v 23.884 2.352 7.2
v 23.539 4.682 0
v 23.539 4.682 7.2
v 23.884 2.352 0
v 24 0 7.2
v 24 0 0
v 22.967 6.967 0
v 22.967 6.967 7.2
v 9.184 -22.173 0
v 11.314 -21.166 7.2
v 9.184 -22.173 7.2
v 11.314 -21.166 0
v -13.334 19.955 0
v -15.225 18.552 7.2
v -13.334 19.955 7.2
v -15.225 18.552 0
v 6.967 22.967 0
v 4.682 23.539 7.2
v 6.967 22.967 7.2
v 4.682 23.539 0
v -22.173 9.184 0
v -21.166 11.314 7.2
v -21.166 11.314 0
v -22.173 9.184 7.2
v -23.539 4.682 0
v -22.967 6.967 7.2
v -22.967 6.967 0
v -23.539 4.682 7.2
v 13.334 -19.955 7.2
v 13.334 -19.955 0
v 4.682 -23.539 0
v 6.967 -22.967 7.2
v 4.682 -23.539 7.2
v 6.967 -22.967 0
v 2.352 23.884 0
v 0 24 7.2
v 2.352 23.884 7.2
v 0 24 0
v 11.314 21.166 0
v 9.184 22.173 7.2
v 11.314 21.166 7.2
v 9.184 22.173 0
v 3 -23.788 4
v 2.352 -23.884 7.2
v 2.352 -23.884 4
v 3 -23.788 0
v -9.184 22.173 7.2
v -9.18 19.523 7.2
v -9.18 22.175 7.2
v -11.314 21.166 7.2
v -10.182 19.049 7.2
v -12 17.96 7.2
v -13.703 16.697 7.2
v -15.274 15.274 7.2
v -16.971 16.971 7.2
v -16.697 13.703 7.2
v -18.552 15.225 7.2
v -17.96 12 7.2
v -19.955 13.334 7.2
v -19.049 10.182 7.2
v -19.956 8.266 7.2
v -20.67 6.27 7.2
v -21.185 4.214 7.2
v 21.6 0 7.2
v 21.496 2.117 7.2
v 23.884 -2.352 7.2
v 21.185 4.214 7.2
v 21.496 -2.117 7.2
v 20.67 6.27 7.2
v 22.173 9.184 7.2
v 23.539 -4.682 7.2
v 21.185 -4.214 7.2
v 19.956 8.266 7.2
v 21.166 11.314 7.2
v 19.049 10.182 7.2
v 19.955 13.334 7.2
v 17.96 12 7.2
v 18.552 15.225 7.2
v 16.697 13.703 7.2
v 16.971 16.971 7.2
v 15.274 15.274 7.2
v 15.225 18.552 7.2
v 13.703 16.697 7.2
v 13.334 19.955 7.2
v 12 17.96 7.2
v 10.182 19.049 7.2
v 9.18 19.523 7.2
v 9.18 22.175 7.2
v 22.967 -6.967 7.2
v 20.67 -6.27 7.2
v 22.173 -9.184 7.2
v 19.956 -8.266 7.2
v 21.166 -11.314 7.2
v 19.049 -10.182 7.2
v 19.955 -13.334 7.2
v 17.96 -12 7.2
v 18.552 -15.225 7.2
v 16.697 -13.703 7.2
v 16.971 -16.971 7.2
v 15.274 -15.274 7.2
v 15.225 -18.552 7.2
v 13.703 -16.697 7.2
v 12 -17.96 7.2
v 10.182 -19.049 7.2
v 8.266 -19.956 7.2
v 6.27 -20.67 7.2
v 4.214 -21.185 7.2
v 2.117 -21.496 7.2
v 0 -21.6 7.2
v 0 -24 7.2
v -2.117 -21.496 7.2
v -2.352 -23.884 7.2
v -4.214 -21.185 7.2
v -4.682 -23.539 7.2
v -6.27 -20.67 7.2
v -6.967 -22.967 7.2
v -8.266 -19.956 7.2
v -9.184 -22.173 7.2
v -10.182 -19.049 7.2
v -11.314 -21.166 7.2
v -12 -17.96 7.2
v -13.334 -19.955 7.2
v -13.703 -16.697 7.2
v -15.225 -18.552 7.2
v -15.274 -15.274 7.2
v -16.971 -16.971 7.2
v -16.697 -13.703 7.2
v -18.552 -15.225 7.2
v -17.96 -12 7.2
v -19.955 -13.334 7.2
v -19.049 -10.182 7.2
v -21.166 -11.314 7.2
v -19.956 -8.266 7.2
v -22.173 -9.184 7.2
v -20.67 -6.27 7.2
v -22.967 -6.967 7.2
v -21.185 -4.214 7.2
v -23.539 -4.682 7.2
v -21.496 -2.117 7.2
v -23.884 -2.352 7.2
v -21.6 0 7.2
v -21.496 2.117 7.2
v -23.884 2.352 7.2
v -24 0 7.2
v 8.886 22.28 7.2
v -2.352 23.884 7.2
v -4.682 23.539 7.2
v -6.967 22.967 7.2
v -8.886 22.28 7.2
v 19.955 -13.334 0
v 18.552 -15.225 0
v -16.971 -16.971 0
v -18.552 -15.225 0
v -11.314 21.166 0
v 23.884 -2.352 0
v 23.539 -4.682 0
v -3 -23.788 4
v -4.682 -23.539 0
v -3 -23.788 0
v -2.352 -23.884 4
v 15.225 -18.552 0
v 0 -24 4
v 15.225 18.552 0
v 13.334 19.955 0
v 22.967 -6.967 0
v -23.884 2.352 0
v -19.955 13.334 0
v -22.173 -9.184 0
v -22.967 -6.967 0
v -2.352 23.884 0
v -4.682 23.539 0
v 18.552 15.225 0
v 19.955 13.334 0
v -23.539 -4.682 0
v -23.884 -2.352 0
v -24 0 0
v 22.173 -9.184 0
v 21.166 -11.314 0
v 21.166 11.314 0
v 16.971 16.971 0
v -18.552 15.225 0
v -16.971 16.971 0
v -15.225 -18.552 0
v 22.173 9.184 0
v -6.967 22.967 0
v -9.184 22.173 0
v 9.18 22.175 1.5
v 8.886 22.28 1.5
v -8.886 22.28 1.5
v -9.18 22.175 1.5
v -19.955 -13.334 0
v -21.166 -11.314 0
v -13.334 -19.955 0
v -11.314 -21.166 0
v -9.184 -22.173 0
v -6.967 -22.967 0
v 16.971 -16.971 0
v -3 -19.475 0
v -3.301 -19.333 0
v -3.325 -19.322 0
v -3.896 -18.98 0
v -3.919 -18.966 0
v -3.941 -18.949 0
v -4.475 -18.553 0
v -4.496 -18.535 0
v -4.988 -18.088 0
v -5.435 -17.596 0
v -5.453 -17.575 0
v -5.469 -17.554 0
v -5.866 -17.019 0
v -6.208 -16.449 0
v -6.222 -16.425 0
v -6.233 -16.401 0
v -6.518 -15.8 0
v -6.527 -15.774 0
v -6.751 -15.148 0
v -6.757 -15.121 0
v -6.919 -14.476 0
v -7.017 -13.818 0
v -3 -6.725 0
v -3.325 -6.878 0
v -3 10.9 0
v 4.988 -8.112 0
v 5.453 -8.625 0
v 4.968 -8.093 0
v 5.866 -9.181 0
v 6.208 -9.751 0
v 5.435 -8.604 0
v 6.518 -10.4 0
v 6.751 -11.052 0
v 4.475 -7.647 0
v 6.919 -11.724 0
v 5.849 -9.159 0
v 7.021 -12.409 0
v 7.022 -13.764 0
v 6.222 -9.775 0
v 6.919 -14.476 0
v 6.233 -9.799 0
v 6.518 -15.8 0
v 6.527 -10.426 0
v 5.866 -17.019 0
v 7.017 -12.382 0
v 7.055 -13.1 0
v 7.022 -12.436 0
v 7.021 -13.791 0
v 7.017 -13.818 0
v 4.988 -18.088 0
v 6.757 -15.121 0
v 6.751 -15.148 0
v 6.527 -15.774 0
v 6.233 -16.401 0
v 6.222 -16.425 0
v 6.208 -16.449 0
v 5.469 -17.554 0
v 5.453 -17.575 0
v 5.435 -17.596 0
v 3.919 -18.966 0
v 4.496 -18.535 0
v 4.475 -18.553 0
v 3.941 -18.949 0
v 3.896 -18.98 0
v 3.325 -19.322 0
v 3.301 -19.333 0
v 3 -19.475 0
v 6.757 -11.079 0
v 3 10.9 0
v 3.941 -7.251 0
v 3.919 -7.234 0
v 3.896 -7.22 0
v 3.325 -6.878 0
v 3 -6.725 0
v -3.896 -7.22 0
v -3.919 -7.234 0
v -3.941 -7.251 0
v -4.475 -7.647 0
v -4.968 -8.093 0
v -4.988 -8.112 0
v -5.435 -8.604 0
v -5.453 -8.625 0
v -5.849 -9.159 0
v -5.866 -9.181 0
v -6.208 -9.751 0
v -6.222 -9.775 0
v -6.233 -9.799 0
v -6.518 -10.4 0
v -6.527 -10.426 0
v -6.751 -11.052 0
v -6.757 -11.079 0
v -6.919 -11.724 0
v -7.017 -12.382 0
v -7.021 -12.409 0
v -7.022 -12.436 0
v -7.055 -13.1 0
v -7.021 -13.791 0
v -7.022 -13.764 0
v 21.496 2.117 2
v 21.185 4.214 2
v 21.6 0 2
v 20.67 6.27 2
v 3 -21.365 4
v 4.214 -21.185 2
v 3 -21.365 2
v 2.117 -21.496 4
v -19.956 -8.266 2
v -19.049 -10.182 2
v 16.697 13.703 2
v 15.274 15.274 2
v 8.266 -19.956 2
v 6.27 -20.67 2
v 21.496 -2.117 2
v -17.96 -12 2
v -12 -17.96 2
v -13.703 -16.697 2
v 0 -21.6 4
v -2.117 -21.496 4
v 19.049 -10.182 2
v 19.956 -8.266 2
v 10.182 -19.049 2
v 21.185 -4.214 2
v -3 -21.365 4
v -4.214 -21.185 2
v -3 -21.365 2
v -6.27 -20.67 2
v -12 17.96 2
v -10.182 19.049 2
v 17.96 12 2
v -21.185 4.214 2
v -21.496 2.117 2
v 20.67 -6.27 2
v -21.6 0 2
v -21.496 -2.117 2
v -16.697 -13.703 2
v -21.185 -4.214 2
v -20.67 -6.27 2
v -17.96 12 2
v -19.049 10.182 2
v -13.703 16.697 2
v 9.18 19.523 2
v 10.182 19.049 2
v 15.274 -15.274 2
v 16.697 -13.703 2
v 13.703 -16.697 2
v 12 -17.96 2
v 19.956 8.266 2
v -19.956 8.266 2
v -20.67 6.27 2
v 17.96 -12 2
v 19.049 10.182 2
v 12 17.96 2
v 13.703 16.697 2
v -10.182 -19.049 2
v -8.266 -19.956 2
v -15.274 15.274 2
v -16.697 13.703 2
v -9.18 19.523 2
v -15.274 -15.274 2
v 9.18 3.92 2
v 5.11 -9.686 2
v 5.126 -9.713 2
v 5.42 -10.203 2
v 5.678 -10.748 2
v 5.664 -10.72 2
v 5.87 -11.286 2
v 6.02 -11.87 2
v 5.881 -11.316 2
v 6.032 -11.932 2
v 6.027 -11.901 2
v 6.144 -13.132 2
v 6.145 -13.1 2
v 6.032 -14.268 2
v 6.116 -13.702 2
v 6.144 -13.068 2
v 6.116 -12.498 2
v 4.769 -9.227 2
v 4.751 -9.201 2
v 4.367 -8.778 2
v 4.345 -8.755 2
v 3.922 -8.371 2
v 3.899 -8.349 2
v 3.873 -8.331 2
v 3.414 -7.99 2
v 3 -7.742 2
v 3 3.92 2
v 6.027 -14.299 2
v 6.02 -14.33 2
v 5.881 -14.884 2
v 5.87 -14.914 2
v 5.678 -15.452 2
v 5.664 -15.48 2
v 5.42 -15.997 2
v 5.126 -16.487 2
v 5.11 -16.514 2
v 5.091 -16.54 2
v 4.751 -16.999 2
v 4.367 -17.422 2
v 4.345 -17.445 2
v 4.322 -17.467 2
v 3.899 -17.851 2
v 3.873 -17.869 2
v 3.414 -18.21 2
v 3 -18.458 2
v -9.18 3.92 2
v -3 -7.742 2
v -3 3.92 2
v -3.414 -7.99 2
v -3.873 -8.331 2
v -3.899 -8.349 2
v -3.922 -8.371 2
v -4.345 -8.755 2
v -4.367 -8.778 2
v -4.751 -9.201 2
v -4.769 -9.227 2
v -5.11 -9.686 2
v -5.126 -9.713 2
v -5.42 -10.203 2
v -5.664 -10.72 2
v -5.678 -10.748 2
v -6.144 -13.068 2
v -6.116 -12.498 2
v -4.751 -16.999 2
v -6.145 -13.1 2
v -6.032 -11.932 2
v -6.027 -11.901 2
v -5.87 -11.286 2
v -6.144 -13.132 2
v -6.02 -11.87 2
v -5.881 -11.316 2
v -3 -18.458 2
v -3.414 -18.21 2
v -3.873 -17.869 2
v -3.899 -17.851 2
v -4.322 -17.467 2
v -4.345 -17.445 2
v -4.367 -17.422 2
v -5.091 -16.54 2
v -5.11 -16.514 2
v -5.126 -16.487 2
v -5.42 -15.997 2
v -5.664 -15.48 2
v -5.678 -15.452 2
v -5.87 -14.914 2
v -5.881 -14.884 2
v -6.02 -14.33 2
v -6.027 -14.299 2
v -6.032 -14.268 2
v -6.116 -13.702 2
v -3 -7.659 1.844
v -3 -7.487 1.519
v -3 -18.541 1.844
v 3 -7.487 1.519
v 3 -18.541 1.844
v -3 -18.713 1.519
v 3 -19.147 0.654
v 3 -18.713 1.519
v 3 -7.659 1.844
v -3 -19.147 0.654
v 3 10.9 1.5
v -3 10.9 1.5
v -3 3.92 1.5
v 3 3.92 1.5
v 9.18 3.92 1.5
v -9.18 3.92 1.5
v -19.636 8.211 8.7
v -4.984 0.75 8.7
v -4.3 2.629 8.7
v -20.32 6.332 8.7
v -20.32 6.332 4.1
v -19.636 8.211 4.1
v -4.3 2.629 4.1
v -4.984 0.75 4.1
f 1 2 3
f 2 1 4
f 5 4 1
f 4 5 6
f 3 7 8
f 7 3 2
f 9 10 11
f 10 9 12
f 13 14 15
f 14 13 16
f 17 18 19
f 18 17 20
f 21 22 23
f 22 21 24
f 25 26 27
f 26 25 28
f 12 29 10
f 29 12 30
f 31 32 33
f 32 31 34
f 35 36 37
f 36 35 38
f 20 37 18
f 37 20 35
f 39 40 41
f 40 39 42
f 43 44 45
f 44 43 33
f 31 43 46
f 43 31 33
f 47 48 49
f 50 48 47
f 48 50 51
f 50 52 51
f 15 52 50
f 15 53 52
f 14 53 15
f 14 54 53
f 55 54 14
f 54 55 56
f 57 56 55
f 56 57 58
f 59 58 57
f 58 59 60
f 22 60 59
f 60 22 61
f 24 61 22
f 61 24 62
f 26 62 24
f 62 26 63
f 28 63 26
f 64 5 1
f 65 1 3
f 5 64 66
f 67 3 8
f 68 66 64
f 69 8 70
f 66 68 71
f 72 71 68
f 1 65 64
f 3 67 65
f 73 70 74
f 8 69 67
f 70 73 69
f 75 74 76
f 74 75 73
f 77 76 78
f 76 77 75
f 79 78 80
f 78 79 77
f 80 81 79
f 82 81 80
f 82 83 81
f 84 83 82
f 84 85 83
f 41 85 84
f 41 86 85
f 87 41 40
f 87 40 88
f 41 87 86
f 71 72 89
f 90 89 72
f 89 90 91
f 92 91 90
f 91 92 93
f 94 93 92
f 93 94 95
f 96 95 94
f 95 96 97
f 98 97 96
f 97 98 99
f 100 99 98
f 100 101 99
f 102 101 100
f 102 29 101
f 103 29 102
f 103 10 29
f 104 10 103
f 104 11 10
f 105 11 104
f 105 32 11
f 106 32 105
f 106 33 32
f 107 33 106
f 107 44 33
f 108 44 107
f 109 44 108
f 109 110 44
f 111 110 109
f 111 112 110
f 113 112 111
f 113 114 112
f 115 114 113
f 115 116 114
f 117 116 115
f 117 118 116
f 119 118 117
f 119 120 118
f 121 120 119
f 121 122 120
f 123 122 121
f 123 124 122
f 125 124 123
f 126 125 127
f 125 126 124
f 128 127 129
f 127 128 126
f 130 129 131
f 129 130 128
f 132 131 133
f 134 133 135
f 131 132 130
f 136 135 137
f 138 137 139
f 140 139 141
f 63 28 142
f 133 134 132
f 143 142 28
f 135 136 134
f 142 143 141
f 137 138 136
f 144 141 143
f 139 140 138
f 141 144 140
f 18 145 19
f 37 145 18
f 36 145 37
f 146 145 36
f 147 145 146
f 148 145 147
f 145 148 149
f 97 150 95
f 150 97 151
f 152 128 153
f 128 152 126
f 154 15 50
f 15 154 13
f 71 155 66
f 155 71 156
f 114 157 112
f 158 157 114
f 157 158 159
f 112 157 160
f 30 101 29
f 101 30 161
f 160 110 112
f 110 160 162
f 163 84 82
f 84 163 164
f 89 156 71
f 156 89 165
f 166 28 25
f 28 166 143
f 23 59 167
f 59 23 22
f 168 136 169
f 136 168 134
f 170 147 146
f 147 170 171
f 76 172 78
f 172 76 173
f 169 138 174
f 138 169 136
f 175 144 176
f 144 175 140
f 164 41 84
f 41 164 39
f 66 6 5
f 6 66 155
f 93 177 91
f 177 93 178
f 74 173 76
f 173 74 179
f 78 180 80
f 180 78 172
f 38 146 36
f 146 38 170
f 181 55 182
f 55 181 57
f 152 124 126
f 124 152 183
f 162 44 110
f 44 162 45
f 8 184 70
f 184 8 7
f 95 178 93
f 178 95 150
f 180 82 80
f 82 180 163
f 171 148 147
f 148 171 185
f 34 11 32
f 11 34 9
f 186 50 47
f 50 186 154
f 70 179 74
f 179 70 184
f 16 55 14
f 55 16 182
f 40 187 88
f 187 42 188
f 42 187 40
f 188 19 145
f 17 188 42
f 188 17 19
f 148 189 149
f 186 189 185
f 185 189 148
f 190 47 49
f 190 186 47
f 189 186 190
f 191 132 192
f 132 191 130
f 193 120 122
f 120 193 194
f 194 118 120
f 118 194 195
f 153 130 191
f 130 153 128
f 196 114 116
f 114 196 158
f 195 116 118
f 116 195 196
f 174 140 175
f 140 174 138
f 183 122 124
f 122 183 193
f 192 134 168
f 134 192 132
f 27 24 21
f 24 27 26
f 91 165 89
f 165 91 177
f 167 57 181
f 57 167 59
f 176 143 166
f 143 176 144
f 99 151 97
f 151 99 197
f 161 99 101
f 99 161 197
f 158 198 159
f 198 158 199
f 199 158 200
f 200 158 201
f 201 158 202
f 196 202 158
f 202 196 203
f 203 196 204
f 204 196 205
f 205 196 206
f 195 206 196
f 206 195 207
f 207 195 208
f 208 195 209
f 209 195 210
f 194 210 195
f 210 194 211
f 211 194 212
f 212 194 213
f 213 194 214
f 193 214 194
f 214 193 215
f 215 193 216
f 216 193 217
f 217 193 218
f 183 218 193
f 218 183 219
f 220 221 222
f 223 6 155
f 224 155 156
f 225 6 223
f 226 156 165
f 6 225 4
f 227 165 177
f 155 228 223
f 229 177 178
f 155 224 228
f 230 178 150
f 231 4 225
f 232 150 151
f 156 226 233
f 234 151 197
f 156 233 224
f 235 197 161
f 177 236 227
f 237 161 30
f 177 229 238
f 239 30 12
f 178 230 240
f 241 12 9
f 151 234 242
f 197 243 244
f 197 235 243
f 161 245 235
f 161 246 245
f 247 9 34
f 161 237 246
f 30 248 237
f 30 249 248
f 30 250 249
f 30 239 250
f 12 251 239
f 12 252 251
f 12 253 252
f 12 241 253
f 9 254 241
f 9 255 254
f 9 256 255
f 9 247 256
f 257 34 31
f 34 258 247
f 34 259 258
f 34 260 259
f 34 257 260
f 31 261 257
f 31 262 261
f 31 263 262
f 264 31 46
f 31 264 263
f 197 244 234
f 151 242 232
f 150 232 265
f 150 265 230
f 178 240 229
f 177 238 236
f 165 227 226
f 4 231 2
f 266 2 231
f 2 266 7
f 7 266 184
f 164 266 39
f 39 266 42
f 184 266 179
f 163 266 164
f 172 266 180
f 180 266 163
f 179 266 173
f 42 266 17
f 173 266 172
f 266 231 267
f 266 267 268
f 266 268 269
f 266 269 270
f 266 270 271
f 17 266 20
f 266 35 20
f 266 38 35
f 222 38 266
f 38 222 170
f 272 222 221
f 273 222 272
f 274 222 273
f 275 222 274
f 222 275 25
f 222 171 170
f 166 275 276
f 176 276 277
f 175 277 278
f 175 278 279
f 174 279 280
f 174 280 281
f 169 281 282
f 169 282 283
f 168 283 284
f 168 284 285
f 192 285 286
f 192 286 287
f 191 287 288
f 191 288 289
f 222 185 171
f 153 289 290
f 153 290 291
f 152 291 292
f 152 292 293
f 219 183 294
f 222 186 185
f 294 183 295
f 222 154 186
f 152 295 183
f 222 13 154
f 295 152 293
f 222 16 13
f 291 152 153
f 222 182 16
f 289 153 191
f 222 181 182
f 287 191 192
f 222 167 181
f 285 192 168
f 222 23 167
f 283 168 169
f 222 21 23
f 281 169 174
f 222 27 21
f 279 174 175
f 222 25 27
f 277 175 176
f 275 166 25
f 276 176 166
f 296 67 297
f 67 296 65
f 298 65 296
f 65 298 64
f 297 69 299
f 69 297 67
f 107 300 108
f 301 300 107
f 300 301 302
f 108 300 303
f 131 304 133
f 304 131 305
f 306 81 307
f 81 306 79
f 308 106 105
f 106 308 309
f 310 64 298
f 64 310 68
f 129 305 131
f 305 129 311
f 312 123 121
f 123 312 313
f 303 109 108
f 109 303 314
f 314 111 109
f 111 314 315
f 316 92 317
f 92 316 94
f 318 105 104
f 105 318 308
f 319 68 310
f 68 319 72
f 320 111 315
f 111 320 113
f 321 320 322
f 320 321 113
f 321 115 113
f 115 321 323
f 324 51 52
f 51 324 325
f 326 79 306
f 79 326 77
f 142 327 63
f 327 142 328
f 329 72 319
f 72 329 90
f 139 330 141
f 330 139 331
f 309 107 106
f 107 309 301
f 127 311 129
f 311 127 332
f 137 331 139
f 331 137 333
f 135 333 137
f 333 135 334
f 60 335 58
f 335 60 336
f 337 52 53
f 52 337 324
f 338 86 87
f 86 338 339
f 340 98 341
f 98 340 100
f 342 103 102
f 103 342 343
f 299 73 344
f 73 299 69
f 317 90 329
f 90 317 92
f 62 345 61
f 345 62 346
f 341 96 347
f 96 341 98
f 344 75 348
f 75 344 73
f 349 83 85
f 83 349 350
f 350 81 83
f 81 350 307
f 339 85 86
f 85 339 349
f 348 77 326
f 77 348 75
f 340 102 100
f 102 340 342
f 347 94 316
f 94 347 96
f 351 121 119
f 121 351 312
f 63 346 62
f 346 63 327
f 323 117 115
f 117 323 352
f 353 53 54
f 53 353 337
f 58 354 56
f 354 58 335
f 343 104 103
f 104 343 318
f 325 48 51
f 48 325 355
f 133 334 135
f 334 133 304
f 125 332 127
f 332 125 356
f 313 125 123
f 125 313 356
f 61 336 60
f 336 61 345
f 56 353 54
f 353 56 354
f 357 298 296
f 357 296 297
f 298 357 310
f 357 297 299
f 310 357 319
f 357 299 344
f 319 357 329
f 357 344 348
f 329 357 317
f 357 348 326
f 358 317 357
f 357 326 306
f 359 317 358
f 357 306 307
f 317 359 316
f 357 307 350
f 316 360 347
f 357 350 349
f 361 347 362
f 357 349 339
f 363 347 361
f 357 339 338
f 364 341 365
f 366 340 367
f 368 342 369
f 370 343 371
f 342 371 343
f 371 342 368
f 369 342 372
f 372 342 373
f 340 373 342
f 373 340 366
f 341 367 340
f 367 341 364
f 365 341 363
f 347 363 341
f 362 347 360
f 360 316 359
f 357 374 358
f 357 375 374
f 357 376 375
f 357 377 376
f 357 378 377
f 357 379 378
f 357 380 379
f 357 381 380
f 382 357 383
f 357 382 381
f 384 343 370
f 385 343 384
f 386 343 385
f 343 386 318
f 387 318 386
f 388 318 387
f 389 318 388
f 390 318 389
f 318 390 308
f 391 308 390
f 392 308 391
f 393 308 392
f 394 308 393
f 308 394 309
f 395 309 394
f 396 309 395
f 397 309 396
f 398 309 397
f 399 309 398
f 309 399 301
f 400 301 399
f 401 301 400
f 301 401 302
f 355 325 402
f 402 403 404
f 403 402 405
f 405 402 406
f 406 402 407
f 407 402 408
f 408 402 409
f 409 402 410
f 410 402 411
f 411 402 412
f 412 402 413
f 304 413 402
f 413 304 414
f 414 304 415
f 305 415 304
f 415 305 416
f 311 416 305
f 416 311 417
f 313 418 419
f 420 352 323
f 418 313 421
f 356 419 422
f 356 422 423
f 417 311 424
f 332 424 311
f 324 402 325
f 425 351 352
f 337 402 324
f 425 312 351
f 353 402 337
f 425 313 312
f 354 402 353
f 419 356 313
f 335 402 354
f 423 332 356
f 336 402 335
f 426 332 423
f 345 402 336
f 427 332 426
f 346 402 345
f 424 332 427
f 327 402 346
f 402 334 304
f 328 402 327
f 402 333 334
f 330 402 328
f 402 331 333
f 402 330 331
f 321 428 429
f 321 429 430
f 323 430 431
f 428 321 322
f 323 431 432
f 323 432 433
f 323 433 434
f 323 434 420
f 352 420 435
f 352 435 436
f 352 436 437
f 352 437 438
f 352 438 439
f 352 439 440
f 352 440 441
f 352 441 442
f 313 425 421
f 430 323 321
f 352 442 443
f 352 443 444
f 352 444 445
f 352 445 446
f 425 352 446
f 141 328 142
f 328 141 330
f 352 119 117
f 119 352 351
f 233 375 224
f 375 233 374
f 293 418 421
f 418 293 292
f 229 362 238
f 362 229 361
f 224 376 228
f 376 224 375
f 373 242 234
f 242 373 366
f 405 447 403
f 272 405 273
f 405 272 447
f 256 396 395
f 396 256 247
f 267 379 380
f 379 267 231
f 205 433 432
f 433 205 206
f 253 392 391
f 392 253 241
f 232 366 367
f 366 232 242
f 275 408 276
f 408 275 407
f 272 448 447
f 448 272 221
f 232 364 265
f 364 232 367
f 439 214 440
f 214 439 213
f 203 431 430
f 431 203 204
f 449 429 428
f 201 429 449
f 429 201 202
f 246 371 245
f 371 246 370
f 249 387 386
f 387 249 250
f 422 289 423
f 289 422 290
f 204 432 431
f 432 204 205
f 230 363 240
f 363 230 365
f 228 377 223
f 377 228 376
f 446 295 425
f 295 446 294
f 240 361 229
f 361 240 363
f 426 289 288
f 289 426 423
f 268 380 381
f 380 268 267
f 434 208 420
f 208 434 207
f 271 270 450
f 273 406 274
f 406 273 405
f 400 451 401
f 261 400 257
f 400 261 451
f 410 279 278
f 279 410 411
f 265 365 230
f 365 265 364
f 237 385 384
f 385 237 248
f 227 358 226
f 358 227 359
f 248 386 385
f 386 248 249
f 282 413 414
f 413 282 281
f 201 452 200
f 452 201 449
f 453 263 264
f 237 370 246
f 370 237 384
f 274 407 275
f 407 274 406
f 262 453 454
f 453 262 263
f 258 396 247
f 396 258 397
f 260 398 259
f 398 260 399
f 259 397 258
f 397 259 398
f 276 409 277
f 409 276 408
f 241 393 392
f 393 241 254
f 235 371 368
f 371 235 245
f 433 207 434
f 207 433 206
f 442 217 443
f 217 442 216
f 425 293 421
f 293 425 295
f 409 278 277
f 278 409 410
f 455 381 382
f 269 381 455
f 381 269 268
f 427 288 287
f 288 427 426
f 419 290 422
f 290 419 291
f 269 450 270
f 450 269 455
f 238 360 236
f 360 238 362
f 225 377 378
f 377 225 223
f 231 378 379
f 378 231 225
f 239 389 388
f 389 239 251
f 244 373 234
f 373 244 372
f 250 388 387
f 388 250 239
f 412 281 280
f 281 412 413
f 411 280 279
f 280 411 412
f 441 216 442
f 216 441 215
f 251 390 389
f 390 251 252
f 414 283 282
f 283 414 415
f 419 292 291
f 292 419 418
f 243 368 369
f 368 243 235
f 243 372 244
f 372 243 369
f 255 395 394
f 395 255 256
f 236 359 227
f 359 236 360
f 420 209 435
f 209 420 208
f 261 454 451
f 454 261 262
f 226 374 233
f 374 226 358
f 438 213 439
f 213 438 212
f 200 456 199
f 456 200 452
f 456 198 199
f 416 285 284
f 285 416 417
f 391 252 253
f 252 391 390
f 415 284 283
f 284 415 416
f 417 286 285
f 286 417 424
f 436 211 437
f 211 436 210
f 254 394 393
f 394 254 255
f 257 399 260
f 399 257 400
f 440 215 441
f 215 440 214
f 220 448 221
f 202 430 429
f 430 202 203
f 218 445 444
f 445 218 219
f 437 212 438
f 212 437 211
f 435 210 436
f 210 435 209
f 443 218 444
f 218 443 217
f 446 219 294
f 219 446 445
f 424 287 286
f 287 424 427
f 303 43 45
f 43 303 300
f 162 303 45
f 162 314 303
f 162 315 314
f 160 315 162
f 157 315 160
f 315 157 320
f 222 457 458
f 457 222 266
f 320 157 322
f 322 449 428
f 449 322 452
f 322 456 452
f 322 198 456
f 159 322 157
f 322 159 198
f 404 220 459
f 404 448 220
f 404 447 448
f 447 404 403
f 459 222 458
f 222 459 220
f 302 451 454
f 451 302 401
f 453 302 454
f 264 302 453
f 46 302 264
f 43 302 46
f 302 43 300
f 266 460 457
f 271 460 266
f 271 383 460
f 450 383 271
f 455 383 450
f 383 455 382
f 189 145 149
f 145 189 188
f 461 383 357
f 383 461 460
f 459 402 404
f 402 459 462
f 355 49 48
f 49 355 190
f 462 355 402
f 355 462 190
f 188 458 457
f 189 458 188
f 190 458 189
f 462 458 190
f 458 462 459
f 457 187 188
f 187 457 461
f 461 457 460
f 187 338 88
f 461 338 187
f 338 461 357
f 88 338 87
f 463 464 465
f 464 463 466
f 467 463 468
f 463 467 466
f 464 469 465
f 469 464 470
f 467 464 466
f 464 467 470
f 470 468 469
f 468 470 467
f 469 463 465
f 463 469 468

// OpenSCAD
// file: params.scad
// params.scad — shared parametric variables for the singulation module.
//
// EVERYTHING pill-specific lives here so a new pill regenerates every part
// (brief §4: "parametric pocket dimensions exposed as top-level variables").
// Measure your real pill with calipers, edit the four PILL numbers, re-render.
//
// Units: millimetres. Coordinate convention: disc lies in the XY plane, rotates
// about +Z; pills fall in -Z into the chute.

// ─────────────────────────────────────────────────────────────────────────────
// PILL (measure these)
// ─────────────────────────────────────────────────────────────────────────────
pill_shape     = "round";  // "round" (tablet) | "oblong" (capsule)
pill_diameter  = 9.0;      // round: tablet diameter
pill_thickness = 4.0;      // round: tablet height  (== oblong: capsule diameter)
pill_length    = 15.0;     // oblong: capsule length (ignored when round)
pill_width     = 7.0;      // oblong: capsule width  (ignored when round)

// ─────────────────────────────────────────────────────────────────────────────
// POCKET (derived from the pill + clearances — tune the clearances per pill)
// ─────────────────────────────────────────────────────────────────────────────
pocket_side_clear = 0.6;   // added around the pill so it drops in freely (not tight)
pocket_chamfer    = 0.8;   // chamfer at the pocket mouth so pills self-seat (anti-jam)

// Pocket depth ≈ ONE pill thickness so a second pill can't stack + ride along
// (brief §4). The disc thickness equals the pocket depth (pockets are through the
// disc; the housing floor holds the pill until it reaches the drop-hole).
pocket_depth      = pill_thickness + 0.6;   // small clearance over pill height

// Round pocket bore / oblong pocket footprint (computed, but overridable):
round_pocket_d    = pill_diameter + 2*pocket_side_clear;
oblong_pocket_l   = pill_length   + 2*pocket_side_clear;
oblong_pocket_w   = pill_width    + 2*pocket_side_clear;

// ─────────────────────────────────────────────────────────────────────────────
// DISC
// ─────────────────────────────────────────────────────────────────────────────
pocket_count   = 6;        // pockets evenly spaced around the disc
disc_edge_wall = 3.0;      // material between a pocket and the disc rim
disc_hub_d     = 14.0;     // solid central hub diameter (around the shaft)
disc_thickness = pocket_depth;               // see note above

// Radius of the circle the pocket CENTRES sit on. Derived so neighbouring pockets
// don't overlap and there's wall to the rim. Max pocket footprint radius:
pocket_reach   = (pill_shape == "oblong")
                    ? max(oblong_pocket_l, oblong_pocket_w)/2
                    : round_pocket_d/2;
pocket_ring_r  = max(disc_hub_d/2 + pocket_reach + 1,
                     // keep arc gap between pockets ≥ their footprint:
                     (pocket_reach + 1) / sin(180/pocket_count));
disc_d         = 2*(pocket_ring_r + pocket_reach + disc_edge_wall);

// ─────────────────────────────────────────────────────────────────────────────
// SHAFT / ACTUATOR COUPLING
// ─────────────────────────────────────────────────────────────────────────────
// "servo" = press onto an SG90 horn; "dshaft" = 5 mm D-shaft (stepper/motor).
shaft_type     = "servo";
dshaft_d       = 5.0;      // 28BYJ-48 / motor D-shaft nominal
dshaft_flat    = 3.0;      // flat-to-round chord for the D
servo_horn_d   = 8.0;      // recess dia for a round servo horn to sit in
servo_horn_h   = 2.0;      // horn thickness recess

// ─────────────────────────────────────────────────────────────────────────────
// HOUSING / CHUTE
// ─────────────────────────────────────────────────────────────────────────────
disc_clear     = 0.4;      // radial gap disc↔housing so it spins freely
floor_thick    = 2.0;      // housing floor under the disc
wiper_gap      = pill_thickness + 0.4;  // scraper lip height above disc face
drop_hole_d    = round_pocket_d + 2;    // clearance hole in floor at drop station
sensor_slot_w  = 6.0;      // slot for the IR emitter/receiver across the chute
wall           = 2.4;      // general printed wall thickness

// Rendering smoothness
$fn = 64;
// main file
// disc_housing.scad — holds the disc + actuator; has the scoop window under the
// hopper, the drop-hole to the chute, the fixed wiper/scraper lip, and the IR
// sensor slot. (brief §8: disc_housing.scad)
//
// The disc (singulation_disc.scad) sits in the circular pocket of this housing,
// resting on the floor. The floor blocks pockets everywhere EXCEPT the drop-hole,
// so a pill rides in its pocket until it reaches the drop station and falls.
include <params.scad>

// Where, around the disc, things sit (degrees). Hopper scoops on one side; the
// drop-hole is offset so a scooped pill travels under the wiper before dropping.
scoop_angle = 90;    // hopper feeds here
drop_angle  = 270;   // pill falls here (opposite side)
wiper_angle = 160;   // scraper lip sits between scoop and drop

housing_od   = disc_d + 2*(disc_clear + wall);
cavity_d     = disc_d + 2*disc_clear;
cavity_h     = disc_thickness + 0.6;          // a hair over disc so it spins free
housing_h    = floor_thick + cavity_h;

module disc_cavity() {
  translate([0, 0, floor_thick])
    cylinder(h = cavity_h + 0.1, d = cavity_d);
}

module drop_hole() {
  // Through the floor at the drop station, tapering outward downward into the chute.
  translate([pocket_ring_r, 0, 0]) rotate([0,0,0])
    translate([0,0,-0.1])
      cylinder(h = floor_thick + 0.2, d1 = drop_hole_d + 2, d2 = drop_hole_d);
}

module sensor_slot() {
  // Horizontal slot across the drop path for the IR emitter/receiver beam.
  translate([pocket_ring_r, 0, floor_thick/2])
    cube([housing_od, sensor_slot_w, sensor_slot_w], center = true);
}

module wiper_lip() {
  // Fixed scraper: a lip that hangs above the disc face at height `wiper_gap`,
  // knocking back any pill NOT seated flush in a pocket (anti double-stack).
  a = wiper_angle;
  translate([0,0,floor_thick + wiper_gap])
    rotate([0,0,a])
      translate([pocket_ring_r, 0, 0])
        cube([round_pocket_d*1.6, 2.0, disc_thickness], center = true);
}

module housing_body() {
  difference() {
    cylinder(h = housing_h, d = housing_od);   // solid puck
    disc_cavity();                             // recess the disc sits in
    rotate([0,0,drop_angle]) drop_hole();      // pill exit
    rotate([0,0,drop_angle]) sensor_slot();    // IR beam across the exit
    // scoop window: open the cavity wall toward the hopper so pills can enter
    rotate([0,0,scoop_angle])
      translate([pocket_ring_r, 0, floor_thick + cavity_h/2])
        cube([round_pocket_d*1.8, round_pocket_d*1.8, cavity_h + 1], center = true);
  }
}

module disc_housing() {
  union() {
    housing_body();
    wiper_lip();
    // NOTE: actuator mount (SG90 pocket OR 28BYJ-48 boss) bolts to the underside.
    // Left as a labelled stub — its footprint depends on shaft_type and is added in
    // Phase C once the disc↔shaft coupling is validated on a printed test piece.
  }
}

disc_housing();

echo(str("housing_od=", housing_od, "  drop_angle=", drop_angle,
         "  wiper_gap=", wiper_gap));
